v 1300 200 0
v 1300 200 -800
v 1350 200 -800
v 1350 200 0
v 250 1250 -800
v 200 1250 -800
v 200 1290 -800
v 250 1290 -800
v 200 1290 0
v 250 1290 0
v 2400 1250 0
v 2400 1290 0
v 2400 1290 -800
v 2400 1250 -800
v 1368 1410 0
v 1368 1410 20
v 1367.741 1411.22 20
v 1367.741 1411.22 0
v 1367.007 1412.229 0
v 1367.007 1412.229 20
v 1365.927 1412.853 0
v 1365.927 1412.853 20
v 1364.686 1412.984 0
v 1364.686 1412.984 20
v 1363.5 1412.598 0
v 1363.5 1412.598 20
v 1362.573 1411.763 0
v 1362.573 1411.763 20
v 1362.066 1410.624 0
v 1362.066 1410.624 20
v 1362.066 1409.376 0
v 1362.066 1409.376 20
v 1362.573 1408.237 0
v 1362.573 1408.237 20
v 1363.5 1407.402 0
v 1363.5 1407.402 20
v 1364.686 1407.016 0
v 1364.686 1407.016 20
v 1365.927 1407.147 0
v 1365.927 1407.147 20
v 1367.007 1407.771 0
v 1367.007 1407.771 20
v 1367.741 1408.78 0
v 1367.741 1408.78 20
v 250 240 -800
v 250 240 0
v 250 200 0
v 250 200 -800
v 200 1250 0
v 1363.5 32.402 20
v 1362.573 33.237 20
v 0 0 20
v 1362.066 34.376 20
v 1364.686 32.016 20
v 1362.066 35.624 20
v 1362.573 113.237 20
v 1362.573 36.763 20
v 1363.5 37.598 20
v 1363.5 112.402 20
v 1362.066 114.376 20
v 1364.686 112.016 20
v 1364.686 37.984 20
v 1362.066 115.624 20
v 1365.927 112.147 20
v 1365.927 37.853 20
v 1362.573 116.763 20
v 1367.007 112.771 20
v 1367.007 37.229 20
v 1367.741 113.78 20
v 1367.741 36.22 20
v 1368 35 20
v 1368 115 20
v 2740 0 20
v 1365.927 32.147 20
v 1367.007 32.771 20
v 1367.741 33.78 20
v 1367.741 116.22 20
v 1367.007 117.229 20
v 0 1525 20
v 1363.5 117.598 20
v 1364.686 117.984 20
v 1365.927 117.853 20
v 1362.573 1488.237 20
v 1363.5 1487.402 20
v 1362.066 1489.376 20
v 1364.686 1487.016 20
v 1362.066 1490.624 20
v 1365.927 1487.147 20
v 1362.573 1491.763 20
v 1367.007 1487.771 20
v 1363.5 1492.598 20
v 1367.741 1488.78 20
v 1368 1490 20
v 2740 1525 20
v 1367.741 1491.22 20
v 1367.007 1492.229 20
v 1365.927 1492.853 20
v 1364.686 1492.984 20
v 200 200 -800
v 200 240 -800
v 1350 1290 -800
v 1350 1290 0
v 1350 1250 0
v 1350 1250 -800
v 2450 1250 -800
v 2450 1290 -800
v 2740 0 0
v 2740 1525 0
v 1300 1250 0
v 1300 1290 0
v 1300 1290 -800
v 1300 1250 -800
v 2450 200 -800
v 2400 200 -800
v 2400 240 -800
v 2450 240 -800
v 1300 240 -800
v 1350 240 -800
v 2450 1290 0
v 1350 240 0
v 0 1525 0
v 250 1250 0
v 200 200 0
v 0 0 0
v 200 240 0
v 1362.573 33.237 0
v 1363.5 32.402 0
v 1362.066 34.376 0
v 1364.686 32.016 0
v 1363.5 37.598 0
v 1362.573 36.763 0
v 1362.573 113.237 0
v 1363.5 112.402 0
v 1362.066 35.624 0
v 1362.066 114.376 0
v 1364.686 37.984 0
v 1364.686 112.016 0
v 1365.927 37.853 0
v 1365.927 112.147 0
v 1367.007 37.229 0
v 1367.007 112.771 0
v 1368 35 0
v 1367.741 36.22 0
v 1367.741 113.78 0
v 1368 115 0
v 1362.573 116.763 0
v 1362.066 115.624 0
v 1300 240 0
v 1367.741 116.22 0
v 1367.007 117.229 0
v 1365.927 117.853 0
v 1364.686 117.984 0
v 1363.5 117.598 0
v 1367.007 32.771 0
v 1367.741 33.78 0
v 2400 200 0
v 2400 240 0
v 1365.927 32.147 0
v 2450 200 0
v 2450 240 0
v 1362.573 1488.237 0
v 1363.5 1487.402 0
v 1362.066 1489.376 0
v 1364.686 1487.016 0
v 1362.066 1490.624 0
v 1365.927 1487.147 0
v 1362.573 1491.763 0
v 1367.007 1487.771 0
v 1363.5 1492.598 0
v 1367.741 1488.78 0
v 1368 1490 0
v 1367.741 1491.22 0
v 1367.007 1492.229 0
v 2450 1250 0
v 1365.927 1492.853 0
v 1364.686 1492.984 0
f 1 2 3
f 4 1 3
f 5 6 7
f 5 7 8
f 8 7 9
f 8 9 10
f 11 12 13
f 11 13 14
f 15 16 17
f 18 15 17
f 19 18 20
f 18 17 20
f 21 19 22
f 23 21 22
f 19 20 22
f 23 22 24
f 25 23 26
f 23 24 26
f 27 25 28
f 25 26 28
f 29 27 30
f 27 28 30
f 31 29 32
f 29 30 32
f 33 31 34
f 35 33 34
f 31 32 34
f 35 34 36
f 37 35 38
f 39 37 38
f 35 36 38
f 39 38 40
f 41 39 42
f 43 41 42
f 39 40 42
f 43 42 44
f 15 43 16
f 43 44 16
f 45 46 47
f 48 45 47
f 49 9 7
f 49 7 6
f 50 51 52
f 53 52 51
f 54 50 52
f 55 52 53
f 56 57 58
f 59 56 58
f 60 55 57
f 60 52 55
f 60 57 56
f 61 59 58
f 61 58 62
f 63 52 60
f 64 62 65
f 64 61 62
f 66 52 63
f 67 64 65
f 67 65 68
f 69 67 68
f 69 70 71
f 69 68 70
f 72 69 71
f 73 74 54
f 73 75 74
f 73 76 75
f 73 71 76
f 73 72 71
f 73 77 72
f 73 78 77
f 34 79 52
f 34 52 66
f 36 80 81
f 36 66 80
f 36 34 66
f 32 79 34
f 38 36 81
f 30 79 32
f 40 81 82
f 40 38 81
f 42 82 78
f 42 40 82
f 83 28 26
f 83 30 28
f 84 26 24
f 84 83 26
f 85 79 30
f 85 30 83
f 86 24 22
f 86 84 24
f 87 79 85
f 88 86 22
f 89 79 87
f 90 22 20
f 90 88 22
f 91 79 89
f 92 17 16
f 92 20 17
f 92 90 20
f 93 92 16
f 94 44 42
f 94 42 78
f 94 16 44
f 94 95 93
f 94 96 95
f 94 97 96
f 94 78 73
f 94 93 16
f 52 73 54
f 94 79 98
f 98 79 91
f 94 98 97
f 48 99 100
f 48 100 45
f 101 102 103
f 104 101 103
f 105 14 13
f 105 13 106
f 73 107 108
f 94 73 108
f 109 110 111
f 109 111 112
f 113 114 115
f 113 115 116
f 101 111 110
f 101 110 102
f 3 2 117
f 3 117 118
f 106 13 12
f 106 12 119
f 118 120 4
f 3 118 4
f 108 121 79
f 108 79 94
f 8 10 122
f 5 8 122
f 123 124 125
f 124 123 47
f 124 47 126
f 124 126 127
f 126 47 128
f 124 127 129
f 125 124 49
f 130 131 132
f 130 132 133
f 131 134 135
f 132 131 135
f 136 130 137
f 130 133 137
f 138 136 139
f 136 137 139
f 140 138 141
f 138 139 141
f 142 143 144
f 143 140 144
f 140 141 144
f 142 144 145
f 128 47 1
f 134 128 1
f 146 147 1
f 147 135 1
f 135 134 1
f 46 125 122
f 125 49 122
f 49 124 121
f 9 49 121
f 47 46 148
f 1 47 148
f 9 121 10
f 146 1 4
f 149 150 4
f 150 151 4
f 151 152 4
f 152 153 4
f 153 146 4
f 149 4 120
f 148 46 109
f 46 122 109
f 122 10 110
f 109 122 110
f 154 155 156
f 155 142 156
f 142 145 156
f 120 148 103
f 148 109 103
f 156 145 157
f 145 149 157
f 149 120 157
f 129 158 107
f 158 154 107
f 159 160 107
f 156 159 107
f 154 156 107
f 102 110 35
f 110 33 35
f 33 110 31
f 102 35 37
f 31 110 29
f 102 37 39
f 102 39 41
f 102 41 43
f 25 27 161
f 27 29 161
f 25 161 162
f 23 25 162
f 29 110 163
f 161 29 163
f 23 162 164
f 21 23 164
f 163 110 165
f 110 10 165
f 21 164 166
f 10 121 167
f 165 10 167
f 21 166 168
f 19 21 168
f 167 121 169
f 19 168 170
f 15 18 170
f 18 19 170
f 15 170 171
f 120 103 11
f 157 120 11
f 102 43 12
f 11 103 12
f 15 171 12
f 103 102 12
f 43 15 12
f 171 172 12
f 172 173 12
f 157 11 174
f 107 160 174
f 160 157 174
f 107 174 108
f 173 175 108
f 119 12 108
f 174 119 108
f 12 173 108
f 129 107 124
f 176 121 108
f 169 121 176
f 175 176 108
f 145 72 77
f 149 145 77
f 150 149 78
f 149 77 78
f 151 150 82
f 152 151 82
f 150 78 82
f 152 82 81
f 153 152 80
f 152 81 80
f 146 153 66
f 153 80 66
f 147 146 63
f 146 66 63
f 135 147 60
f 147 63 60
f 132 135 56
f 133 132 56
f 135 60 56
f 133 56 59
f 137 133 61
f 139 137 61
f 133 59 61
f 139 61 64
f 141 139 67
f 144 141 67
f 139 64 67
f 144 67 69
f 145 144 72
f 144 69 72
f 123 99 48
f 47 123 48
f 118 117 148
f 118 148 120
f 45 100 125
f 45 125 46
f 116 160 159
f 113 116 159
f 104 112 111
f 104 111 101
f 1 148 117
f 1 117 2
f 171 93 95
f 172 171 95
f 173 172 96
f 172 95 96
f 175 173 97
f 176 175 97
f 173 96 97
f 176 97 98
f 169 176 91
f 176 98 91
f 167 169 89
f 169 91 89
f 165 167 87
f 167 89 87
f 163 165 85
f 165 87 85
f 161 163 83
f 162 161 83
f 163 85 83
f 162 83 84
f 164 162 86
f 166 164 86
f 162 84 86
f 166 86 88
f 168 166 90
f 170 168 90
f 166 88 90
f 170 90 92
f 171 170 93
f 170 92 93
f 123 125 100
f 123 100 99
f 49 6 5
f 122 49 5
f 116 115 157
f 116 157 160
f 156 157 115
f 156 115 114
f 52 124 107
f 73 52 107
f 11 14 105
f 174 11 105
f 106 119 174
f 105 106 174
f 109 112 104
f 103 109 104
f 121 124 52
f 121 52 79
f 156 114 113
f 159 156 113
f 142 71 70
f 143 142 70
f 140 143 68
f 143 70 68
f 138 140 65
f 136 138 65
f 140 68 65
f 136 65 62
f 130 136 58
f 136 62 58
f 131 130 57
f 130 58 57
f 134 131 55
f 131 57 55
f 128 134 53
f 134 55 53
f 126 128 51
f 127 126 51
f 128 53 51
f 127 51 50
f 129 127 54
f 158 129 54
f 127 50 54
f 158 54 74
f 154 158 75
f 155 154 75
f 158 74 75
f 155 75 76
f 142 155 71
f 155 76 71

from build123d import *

# Parameters (mm, degrees)
F0_W     = 2740
F0_H     = 1525
F1_DEPTH = 20
F2_R     = 3
F3_DEPTH = 25
F4_W     = 50
F4_H     = 40
F5_DEPTH = 800


with BuildPart() as f1:
    # F0 (on Top) → F1 (new body)
    with BuildSketch(Plane.XY):
        with Locations((1370, 762.5)):
            Rectangle(F0_W, F0_H)
    extrude(amount=F1_DEPTH)

    # F2 (on face) → F3 (cut)
    with BuildSketch(Plane.XY.offset(20)):
        with Locations((1365, 1490)):
            Circle(F2_R)
        with Locations((1365, 1410)):
            Circle(F2_R)
        with Locations((1365, 35)):
            Circle(F2_R)
        with Locations((1365, 115)):
            Circle(F2_R)
    extrude(amount=-F3_DEPTH, mode=Mode.SUBTRACT)

    # F4 (on face) → F5 (join)
    with BuildSketch(Plane(origin=(0, 0, 0), x_dir=(1, 0, 0), z_dir=(0, 0, -1))):
        with Locations((225, -220)):
            Rectangle(F4_W, F4_H)
        with Locations((225, -1270)):
            Rectangle(F4_W, F4_H)
        with Locations((1325, -220)):
            Rectangle(F4_W, F4_H)
        with Locations((1325, -1270)):
            Rectangle(F4_W, F4_H)
        with Locations((2425, -220)):
            Rectangle(F4_W, F4_H)
        with Locations((2425, -1270)):
            Rectangle(F4_W, F4_H)
    extrude(amount=F5_DEPTH)


solid = f1.part
